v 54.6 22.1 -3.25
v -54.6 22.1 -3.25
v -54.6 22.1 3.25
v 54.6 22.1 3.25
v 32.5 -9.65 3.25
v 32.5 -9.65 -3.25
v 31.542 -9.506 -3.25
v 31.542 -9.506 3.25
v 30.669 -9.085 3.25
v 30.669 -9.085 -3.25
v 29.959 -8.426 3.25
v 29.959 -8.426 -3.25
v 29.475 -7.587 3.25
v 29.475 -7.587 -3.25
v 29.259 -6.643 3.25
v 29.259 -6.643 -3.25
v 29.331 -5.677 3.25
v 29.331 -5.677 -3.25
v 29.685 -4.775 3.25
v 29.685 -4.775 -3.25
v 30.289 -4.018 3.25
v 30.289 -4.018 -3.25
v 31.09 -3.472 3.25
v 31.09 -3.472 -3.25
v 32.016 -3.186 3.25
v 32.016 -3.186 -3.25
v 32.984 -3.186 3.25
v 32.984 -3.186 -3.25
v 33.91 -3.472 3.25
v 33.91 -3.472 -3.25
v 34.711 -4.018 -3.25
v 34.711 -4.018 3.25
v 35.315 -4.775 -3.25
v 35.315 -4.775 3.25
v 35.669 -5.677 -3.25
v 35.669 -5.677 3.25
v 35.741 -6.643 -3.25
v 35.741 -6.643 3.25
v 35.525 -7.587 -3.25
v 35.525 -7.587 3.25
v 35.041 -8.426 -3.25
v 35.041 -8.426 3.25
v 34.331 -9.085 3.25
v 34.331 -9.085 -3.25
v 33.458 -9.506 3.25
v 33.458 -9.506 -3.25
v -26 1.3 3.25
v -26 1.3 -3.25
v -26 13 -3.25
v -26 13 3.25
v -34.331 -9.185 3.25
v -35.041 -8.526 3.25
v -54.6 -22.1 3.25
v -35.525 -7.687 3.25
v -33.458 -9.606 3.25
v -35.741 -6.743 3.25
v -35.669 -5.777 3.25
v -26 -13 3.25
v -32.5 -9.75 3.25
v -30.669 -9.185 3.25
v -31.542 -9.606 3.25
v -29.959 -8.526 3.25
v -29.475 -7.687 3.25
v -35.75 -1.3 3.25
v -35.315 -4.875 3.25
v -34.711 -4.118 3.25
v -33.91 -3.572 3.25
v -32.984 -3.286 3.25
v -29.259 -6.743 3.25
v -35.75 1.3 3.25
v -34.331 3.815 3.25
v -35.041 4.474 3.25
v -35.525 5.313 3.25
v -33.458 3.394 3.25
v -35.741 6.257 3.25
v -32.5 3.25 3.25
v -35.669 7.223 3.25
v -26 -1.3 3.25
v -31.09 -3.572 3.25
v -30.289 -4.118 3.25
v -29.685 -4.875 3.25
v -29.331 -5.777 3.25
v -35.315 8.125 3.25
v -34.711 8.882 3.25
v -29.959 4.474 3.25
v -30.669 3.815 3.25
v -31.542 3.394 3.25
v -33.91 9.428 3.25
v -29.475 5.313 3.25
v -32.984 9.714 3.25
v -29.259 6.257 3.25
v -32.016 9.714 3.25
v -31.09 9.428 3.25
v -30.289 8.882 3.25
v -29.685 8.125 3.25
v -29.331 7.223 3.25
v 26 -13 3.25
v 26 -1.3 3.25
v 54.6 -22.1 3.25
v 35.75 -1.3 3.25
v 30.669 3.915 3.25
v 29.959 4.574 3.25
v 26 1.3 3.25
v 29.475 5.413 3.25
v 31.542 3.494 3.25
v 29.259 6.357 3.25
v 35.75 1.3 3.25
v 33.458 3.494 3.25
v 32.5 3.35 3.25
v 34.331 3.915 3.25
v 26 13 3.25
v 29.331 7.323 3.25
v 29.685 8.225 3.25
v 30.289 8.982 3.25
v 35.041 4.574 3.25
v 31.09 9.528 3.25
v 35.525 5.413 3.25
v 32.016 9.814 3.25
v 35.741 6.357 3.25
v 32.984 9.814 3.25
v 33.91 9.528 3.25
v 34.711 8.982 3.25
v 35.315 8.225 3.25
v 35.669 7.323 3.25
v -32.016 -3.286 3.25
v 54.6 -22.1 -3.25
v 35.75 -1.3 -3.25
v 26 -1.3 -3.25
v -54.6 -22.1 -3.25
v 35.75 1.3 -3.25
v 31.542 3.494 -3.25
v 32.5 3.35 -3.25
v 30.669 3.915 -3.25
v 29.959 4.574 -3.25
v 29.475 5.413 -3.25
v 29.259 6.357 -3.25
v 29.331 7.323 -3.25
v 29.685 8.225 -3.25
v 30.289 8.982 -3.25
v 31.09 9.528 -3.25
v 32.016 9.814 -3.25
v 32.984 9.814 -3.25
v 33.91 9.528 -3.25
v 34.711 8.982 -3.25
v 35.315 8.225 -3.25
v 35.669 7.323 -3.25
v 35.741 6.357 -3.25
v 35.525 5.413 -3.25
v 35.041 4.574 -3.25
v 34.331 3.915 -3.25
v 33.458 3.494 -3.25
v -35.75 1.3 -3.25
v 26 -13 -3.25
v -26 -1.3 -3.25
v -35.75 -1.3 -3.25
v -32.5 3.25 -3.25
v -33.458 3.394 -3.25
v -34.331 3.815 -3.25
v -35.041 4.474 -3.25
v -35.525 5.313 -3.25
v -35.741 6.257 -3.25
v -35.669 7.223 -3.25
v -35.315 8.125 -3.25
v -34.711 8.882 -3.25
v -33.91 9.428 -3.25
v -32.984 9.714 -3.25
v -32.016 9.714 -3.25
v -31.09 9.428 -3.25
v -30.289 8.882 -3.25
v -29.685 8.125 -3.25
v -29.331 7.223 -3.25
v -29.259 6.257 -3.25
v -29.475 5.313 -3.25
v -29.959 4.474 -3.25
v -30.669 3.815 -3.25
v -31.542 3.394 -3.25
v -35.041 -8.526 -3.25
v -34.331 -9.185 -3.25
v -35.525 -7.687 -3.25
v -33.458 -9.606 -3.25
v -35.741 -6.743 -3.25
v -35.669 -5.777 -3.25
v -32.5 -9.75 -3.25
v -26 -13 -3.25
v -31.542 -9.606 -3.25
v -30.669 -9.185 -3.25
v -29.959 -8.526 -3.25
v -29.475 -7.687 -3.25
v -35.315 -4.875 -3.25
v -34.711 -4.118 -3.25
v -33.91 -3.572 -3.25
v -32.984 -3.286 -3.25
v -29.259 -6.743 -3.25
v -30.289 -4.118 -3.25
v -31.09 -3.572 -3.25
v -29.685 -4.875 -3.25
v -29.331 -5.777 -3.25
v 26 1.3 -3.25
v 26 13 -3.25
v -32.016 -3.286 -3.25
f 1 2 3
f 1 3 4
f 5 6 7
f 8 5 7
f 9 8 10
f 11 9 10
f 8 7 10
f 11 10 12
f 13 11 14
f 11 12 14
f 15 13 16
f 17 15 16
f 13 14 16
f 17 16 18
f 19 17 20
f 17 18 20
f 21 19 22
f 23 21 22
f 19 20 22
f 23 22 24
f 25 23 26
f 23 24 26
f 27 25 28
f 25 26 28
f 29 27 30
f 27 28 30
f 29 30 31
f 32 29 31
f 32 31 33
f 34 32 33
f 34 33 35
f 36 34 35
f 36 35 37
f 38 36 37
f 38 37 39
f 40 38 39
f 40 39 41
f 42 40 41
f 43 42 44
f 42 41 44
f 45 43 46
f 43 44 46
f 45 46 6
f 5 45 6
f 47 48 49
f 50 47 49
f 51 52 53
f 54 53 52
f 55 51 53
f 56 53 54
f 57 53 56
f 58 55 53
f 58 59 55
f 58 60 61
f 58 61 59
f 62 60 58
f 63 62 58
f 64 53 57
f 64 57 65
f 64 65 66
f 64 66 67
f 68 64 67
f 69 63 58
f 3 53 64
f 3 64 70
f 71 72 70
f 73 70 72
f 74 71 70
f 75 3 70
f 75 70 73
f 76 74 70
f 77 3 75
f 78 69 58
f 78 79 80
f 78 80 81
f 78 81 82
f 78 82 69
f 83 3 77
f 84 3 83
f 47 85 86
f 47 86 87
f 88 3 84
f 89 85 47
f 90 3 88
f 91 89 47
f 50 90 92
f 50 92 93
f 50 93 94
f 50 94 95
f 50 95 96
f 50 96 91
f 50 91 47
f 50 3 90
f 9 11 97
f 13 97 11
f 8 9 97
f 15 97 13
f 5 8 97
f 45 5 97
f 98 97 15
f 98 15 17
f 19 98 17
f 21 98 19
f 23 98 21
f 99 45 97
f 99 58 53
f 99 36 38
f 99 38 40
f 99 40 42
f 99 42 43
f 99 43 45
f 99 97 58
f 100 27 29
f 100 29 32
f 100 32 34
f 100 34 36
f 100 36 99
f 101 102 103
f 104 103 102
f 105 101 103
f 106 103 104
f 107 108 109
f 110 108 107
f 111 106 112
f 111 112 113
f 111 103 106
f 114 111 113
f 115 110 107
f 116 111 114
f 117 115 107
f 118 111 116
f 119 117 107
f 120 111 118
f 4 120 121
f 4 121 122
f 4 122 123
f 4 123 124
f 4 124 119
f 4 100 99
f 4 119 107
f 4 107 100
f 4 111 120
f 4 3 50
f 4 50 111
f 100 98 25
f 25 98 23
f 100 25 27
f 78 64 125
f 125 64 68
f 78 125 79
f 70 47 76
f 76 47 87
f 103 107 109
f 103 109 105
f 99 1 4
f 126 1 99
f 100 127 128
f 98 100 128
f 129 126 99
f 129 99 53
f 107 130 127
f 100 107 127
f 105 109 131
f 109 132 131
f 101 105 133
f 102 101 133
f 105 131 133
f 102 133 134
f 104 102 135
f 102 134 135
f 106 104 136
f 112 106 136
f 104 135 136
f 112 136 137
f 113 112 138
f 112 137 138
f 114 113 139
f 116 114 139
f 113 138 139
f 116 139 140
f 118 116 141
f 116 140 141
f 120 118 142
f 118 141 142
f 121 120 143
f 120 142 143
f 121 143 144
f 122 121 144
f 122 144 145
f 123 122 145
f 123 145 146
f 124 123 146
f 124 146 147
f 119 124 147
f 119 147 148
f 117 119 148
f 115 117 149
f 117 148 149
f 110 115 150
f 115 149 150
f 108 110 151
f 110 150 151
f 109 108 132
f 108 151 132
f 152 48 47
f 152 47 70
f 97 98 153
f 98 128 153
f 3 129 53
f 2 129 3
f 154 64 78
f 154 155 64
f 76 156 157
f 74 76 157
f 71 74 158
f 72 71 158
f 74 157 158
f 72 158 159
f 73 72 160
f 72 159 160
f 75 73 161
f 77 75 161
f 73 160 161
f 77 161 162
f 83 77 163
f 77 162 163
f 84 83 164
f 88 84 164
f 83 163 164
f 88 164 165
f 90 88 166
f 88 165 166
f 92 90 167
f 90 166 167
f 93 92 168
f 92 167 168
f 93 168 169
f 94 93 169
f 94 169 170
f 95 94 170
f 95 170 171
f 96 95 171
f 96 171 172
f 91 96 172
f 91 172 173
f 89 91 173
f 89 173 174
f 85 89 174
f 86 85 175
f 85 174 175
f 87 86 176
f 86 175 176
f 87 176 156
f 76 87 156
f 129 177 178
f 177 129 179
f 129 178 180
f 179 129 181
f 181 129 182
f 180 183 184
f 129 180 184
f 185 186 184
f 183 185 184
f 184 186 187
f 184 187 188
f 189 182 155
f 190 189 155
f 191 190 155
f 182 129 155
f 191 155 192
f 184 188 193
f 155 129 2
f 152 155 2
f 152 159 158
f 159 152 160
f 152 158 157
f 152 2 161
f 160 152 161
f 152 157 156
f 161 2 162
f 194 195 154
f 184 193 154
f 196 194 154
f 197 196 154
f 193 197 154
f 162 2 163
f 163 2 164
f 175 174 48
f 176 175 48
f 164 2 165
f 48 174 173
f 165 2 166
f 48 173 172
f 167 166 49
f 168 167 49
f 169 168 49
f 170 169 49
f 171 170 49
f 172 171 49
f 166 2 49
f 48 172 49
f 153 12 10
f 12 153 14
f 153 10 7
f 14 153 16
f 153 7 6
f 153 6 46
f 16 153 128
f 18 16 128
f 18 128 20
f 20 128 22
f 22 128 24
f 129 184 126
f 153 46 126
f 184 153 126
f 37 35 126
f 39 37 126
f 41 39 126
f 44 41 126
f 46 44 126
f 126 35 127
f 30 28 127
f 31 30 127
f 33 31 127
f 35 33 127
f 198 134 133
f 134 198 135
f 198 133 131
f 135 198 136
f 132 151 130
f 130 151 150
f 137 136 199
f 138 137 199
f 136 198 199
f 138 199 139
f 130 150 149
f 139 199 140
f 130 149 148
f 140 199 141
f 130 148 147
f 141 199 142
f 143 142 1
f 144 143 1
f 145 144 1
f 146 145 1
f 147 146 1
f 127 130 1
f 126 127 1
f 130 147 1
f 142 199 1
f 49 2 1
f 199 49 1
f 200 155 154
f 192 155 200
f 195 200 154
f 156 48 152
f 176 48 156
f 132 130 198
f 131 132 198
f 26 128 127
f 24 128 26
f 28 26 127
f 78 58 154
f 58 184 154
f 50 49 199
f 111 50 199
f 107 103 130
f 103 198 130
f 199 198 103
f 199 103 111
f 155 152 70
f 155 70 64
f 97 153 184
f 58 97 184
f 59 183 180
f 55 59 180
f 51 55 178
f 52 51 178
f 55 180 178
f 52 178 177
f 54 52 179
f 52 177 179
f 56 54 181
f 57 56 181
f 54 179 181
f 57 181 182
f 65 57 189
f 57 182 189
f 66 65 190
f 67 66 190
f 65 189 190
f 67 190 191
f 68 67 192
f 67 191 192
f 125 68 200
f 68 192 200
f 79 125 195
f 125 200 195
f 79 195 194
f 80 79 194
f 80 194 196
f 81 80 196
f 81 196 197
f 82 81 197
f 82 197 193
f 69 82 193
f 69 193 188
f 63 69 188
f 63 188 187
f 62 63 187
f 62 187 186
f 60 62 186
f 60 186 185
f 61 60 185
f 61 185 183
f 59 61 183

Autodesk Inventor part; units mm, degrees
ref_plane "YZ Plane" through (0, 0, 0) normal (1, 0, 0) x (0, 1, 0)
ref_plane "XZ Plane" through (0, 0, 0) normal (0, 1, 0) x (-1, 0, 0)
ref_plane "XY Plane" through (0, 0, 0) normal (0, 0, 1) x (1, 0, 0)
sketch "Sketch1" plane through (0, 0, 0) normal (0, 0, 1) x (1, 0, 0)
  line L0 (-26, 13) -> (26, 13)
  line L1 (26, -13) -> (-26, -13)
  line L2 (-26, 13) -> (26, -13) construction
  line L3 (26, 13) -> (-26, -13) construction
  line L4 (-54.6, 22.1) -> (54.6, 22.1)
  line L5 (54.6, 22.1) -> (54.6, -22.1)
  line L6 (54.6, -22.1) -> (-54.6, -22.1)
  line L7 (-54.6, -22.1) -> (-54.6, 22.1)
  line L8 (-54.6, 22.1) -> (54.6, -22.1) construction
  line L9 (54.6, 22.1) -> (-54.6, -22.1) construction
  line L10 (-26, 1.3) -> (-35.75, 1.3)
  line L11 (-35.75, 1.3) -> (-35.75, -1.3)
  line L12 (-35.75, -1.3) -> (-26, -1.3)
  line L13 (26, 1.3) -> (35.75, 1.3)
  line L14 (35.75, 1.3) -> (35.75, -1.3)
  line L15 (35.75, -1.3) -> (26, -1.3)
  line L16 (-26, 1.3) -> (-26, 13)
  line L17 (-26, -13) -> (-26, -1.3)
  line L18 (26, -1.3) -> (26, -13)
  line L19 (26, 1.3) -> (26, 13)
  point P0 (0, 0)
  point P1 (-35.75, 0)
  point P2 (0, 0)
  dimension "CInt" = 52
  dimension "LInt" = 26
  dimension "Cext" = 109.2
  dimension "Lext" = 44.2
  dimension "Cpeq" = 9.75
  dimension "Lpeq" = 2.6
  dimension "d10" = 9.75
  dimension "d11" = 2.6
extrude "Extrusion1" add sketch "Sketch1" along normal mid plane 6.5
sketch "Sketch8" plane through (0, 0, 3.25) normal (0, 0, 1) x (1, 0, 0)
  point P0 (0, 0)
hole "Hole1" at (-32.5, 6.5, 3.25) direction (0, 0, -1) diameter 6.5 end through all
pattern_linear "Rectangular Pattern1" count 2 spacing 13 along (0, -1, 0) of "Hole1"
hole "Hole2" at (32.5, 6.6, 3.25) direction (0, 0, -1) diameter 6.5 end through all
pattern_linear "Rectangular Pattern2" count 2 spacing 13 along (0, -1, 0) of "Hole2"
properties part number "Cou-3"
